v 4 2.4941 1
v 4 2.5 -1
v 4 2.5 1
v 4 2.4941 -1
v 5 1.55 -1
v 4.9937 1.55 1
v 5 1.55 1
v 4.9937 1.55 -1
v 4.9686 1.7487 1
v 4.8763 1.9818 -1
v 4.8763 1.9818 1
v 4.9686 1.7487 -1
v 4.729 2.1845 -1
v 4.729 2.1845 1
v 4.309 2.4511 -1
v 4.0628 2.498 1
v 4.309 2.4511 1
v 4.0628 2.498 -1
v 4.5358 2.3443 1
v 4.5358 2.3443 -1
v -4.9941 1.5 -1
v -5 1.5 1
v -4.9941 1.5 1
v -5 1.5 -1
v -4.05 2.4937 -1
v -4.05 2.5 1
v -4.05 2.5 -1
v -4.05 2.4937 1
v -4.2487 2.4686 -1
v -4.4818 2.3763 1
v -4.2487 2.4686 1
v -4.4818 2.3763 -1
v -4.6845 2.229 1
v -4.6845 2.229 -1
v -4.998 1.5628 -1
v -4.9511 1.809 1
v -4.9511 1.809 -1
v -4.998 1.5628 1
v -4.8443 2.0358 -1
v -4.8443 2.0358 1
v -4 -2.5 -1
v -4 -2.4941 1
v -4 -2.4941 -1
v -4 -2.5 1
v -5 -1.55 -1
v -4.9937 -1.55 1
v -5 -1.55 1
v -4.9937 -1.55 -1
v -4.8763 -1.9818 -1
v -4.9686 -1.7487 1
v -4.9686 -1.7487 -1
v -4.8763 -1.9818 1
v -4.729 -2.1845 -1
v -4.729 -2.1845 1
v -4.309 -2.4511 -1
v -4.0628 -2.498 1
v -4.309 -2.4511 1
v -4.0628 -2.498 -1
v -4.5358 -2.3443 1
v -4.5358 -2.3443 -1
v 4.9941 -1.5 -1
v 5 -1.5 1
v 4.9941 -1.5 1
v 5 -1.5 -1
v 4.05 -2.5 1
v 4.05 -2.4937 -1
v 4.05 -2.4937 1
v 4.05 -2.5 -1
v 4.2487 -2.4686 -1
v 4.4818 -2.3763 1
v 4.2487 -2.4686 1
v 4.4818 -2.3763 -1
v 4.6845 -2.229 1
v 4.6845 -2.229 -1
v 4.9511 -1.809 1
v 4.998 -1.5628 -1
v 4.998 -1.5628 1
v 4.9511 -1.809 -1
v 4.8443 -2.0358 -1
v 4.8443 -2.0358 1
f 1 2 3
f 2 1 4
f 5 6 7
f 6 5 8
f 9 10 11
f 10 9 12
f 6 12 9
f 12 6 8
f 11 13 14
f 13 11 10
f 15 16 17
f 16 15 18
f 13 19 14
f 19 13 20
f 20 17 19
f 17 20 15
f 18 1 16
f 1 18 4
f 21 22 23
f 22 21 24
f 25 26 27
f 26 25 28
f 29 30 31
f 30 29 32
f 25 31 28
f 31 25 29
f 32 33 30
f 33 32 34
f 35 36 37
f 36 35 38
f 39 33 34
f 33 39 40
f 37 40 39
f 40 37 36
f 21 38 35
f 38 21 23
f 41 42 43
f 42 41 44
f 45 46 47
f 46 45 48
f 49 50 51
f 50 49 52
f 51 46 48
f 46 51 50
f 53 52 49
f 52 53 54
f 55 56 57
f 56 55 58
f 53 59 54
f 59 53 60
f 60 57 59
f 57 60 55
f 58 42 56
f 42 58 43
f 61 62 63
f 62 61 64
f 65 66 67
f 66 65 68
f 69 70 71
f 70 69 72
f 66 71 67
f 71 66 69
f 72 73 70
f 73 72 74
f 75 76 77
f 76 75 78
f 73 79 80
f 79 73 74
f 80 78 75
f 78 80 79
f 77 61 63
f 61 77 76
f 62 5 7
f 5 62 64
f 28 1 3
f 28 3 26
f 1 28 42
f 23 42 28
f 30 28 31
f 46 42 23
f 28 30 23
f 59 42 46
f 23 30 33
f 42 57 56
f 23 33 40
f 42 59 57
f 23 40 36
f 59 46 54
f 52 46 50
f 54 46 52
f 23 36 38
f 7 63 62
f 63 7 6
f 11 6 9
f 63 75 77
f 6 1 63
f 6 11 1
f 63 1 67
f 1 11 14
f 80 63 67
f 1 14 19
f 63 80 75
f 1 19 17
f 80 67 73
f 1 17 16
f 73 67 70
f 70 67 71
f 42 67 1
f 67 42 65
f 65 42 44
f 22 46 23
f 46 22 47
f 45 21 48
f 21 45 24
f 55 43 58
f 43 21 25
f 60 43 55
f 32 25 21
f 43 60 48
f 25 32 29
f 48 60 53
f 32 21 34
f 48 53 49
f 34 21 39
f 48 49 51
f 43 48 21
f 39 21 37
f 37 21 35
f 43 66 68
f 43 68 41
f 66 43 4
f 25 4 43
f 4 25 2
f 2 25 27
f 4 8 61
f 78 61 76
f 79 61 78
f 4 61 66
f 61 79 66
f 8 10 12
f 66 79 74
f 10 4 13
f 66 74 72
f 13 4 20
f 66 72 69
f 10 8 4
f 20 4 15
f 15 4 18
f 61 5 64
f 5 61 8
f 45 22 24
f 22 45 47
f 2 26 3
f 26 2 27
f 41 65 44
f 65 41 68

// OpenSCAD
/*
http://codeviewer.org/view/code:1b36 
Copyright (C) 2011 Sergio Vilches
This program is free software: you can redistribute it and/or modify it under the terms of the GNU General Public License as published by the Free Software Foundation, either version 3 of the License, or (at your option) any later version.
This program is distributed in the hope that it will be useful, but WITHOUT ANY WARRANTY; without even the implied warranty of MERCHANTABILITY or FITNESS FOR A PARTICULAR PURPOSE. See the GNU General Public License for more details. You should have received a copy of the GNU General Public License along with this program. If not, see <http://www.gnu.org/licenses/>.
Contact: s.vilches.e@gmail.com


    ----------------------------------------------------------- 
                 Round Corners Cube (Extruded)                
      roundCornersCube(x,y,z,r) Where:                        
         - x = Xdir width                                     
         - y = Ydir width                                     
         - z = Height of the cube                             
         - r = Rounding radious                               
                                                              
      Example: roundCornerCube(10,10,2,1);                    
     *Some times it's needed to use F6 to see good results!   
 	 ----------------------------------------------------------- 
*/
// Test it!
roundCornersCube(10,5,2,1);




module roundCornersCube(x,y,z,r)  // Now we just substract the shape we have created in the four corners
{
	module createMeniscus(h,radius) // This module creates the shape that needs to be substracted from a cube to make its corners rounded.
	{
		difference(){        //This shape is basicly the difference between a quarter of cylinder and a cube
		   translate([radius/2+0.1,radius/2+0.1,0]){
		      cube([radius+0.2,radius+0.1,h+0.2],center=true);         // All that 0.x numbers are to avoid "ghost boundaries" when substracting
		   }
		
		   cylinder(h=h+0.2,r=radius,$fn = 25,center=true);
		}
	
	}
	difference(){
	   cube([x,y,z], center=true);
	
	translate([x/2-r,y/2-r]){  // We move to the first corner (x,y)
	      rotate(0){  
	         createMeniscus(z,r); // And substract the meniscus
	      }
	   }
	   translate([-x/2+r,y/2-r]){ // To the second corner (-x,y)
	      rotate(90){
	         createMeniscus(z,r); // But this time we have to rotate the meniscus 90 deg
	      }
	   }
	      translate([-x/2+r,-y/2+r]){ // ... 
	      rotate(180){
	         createMeniscus(z,r);
	      }
	   }
	      translate([x/2-r,-y/2+r]){
	      rotate(270){
	         createMeniscus(z,r);
	      }
	   }
	}
}
